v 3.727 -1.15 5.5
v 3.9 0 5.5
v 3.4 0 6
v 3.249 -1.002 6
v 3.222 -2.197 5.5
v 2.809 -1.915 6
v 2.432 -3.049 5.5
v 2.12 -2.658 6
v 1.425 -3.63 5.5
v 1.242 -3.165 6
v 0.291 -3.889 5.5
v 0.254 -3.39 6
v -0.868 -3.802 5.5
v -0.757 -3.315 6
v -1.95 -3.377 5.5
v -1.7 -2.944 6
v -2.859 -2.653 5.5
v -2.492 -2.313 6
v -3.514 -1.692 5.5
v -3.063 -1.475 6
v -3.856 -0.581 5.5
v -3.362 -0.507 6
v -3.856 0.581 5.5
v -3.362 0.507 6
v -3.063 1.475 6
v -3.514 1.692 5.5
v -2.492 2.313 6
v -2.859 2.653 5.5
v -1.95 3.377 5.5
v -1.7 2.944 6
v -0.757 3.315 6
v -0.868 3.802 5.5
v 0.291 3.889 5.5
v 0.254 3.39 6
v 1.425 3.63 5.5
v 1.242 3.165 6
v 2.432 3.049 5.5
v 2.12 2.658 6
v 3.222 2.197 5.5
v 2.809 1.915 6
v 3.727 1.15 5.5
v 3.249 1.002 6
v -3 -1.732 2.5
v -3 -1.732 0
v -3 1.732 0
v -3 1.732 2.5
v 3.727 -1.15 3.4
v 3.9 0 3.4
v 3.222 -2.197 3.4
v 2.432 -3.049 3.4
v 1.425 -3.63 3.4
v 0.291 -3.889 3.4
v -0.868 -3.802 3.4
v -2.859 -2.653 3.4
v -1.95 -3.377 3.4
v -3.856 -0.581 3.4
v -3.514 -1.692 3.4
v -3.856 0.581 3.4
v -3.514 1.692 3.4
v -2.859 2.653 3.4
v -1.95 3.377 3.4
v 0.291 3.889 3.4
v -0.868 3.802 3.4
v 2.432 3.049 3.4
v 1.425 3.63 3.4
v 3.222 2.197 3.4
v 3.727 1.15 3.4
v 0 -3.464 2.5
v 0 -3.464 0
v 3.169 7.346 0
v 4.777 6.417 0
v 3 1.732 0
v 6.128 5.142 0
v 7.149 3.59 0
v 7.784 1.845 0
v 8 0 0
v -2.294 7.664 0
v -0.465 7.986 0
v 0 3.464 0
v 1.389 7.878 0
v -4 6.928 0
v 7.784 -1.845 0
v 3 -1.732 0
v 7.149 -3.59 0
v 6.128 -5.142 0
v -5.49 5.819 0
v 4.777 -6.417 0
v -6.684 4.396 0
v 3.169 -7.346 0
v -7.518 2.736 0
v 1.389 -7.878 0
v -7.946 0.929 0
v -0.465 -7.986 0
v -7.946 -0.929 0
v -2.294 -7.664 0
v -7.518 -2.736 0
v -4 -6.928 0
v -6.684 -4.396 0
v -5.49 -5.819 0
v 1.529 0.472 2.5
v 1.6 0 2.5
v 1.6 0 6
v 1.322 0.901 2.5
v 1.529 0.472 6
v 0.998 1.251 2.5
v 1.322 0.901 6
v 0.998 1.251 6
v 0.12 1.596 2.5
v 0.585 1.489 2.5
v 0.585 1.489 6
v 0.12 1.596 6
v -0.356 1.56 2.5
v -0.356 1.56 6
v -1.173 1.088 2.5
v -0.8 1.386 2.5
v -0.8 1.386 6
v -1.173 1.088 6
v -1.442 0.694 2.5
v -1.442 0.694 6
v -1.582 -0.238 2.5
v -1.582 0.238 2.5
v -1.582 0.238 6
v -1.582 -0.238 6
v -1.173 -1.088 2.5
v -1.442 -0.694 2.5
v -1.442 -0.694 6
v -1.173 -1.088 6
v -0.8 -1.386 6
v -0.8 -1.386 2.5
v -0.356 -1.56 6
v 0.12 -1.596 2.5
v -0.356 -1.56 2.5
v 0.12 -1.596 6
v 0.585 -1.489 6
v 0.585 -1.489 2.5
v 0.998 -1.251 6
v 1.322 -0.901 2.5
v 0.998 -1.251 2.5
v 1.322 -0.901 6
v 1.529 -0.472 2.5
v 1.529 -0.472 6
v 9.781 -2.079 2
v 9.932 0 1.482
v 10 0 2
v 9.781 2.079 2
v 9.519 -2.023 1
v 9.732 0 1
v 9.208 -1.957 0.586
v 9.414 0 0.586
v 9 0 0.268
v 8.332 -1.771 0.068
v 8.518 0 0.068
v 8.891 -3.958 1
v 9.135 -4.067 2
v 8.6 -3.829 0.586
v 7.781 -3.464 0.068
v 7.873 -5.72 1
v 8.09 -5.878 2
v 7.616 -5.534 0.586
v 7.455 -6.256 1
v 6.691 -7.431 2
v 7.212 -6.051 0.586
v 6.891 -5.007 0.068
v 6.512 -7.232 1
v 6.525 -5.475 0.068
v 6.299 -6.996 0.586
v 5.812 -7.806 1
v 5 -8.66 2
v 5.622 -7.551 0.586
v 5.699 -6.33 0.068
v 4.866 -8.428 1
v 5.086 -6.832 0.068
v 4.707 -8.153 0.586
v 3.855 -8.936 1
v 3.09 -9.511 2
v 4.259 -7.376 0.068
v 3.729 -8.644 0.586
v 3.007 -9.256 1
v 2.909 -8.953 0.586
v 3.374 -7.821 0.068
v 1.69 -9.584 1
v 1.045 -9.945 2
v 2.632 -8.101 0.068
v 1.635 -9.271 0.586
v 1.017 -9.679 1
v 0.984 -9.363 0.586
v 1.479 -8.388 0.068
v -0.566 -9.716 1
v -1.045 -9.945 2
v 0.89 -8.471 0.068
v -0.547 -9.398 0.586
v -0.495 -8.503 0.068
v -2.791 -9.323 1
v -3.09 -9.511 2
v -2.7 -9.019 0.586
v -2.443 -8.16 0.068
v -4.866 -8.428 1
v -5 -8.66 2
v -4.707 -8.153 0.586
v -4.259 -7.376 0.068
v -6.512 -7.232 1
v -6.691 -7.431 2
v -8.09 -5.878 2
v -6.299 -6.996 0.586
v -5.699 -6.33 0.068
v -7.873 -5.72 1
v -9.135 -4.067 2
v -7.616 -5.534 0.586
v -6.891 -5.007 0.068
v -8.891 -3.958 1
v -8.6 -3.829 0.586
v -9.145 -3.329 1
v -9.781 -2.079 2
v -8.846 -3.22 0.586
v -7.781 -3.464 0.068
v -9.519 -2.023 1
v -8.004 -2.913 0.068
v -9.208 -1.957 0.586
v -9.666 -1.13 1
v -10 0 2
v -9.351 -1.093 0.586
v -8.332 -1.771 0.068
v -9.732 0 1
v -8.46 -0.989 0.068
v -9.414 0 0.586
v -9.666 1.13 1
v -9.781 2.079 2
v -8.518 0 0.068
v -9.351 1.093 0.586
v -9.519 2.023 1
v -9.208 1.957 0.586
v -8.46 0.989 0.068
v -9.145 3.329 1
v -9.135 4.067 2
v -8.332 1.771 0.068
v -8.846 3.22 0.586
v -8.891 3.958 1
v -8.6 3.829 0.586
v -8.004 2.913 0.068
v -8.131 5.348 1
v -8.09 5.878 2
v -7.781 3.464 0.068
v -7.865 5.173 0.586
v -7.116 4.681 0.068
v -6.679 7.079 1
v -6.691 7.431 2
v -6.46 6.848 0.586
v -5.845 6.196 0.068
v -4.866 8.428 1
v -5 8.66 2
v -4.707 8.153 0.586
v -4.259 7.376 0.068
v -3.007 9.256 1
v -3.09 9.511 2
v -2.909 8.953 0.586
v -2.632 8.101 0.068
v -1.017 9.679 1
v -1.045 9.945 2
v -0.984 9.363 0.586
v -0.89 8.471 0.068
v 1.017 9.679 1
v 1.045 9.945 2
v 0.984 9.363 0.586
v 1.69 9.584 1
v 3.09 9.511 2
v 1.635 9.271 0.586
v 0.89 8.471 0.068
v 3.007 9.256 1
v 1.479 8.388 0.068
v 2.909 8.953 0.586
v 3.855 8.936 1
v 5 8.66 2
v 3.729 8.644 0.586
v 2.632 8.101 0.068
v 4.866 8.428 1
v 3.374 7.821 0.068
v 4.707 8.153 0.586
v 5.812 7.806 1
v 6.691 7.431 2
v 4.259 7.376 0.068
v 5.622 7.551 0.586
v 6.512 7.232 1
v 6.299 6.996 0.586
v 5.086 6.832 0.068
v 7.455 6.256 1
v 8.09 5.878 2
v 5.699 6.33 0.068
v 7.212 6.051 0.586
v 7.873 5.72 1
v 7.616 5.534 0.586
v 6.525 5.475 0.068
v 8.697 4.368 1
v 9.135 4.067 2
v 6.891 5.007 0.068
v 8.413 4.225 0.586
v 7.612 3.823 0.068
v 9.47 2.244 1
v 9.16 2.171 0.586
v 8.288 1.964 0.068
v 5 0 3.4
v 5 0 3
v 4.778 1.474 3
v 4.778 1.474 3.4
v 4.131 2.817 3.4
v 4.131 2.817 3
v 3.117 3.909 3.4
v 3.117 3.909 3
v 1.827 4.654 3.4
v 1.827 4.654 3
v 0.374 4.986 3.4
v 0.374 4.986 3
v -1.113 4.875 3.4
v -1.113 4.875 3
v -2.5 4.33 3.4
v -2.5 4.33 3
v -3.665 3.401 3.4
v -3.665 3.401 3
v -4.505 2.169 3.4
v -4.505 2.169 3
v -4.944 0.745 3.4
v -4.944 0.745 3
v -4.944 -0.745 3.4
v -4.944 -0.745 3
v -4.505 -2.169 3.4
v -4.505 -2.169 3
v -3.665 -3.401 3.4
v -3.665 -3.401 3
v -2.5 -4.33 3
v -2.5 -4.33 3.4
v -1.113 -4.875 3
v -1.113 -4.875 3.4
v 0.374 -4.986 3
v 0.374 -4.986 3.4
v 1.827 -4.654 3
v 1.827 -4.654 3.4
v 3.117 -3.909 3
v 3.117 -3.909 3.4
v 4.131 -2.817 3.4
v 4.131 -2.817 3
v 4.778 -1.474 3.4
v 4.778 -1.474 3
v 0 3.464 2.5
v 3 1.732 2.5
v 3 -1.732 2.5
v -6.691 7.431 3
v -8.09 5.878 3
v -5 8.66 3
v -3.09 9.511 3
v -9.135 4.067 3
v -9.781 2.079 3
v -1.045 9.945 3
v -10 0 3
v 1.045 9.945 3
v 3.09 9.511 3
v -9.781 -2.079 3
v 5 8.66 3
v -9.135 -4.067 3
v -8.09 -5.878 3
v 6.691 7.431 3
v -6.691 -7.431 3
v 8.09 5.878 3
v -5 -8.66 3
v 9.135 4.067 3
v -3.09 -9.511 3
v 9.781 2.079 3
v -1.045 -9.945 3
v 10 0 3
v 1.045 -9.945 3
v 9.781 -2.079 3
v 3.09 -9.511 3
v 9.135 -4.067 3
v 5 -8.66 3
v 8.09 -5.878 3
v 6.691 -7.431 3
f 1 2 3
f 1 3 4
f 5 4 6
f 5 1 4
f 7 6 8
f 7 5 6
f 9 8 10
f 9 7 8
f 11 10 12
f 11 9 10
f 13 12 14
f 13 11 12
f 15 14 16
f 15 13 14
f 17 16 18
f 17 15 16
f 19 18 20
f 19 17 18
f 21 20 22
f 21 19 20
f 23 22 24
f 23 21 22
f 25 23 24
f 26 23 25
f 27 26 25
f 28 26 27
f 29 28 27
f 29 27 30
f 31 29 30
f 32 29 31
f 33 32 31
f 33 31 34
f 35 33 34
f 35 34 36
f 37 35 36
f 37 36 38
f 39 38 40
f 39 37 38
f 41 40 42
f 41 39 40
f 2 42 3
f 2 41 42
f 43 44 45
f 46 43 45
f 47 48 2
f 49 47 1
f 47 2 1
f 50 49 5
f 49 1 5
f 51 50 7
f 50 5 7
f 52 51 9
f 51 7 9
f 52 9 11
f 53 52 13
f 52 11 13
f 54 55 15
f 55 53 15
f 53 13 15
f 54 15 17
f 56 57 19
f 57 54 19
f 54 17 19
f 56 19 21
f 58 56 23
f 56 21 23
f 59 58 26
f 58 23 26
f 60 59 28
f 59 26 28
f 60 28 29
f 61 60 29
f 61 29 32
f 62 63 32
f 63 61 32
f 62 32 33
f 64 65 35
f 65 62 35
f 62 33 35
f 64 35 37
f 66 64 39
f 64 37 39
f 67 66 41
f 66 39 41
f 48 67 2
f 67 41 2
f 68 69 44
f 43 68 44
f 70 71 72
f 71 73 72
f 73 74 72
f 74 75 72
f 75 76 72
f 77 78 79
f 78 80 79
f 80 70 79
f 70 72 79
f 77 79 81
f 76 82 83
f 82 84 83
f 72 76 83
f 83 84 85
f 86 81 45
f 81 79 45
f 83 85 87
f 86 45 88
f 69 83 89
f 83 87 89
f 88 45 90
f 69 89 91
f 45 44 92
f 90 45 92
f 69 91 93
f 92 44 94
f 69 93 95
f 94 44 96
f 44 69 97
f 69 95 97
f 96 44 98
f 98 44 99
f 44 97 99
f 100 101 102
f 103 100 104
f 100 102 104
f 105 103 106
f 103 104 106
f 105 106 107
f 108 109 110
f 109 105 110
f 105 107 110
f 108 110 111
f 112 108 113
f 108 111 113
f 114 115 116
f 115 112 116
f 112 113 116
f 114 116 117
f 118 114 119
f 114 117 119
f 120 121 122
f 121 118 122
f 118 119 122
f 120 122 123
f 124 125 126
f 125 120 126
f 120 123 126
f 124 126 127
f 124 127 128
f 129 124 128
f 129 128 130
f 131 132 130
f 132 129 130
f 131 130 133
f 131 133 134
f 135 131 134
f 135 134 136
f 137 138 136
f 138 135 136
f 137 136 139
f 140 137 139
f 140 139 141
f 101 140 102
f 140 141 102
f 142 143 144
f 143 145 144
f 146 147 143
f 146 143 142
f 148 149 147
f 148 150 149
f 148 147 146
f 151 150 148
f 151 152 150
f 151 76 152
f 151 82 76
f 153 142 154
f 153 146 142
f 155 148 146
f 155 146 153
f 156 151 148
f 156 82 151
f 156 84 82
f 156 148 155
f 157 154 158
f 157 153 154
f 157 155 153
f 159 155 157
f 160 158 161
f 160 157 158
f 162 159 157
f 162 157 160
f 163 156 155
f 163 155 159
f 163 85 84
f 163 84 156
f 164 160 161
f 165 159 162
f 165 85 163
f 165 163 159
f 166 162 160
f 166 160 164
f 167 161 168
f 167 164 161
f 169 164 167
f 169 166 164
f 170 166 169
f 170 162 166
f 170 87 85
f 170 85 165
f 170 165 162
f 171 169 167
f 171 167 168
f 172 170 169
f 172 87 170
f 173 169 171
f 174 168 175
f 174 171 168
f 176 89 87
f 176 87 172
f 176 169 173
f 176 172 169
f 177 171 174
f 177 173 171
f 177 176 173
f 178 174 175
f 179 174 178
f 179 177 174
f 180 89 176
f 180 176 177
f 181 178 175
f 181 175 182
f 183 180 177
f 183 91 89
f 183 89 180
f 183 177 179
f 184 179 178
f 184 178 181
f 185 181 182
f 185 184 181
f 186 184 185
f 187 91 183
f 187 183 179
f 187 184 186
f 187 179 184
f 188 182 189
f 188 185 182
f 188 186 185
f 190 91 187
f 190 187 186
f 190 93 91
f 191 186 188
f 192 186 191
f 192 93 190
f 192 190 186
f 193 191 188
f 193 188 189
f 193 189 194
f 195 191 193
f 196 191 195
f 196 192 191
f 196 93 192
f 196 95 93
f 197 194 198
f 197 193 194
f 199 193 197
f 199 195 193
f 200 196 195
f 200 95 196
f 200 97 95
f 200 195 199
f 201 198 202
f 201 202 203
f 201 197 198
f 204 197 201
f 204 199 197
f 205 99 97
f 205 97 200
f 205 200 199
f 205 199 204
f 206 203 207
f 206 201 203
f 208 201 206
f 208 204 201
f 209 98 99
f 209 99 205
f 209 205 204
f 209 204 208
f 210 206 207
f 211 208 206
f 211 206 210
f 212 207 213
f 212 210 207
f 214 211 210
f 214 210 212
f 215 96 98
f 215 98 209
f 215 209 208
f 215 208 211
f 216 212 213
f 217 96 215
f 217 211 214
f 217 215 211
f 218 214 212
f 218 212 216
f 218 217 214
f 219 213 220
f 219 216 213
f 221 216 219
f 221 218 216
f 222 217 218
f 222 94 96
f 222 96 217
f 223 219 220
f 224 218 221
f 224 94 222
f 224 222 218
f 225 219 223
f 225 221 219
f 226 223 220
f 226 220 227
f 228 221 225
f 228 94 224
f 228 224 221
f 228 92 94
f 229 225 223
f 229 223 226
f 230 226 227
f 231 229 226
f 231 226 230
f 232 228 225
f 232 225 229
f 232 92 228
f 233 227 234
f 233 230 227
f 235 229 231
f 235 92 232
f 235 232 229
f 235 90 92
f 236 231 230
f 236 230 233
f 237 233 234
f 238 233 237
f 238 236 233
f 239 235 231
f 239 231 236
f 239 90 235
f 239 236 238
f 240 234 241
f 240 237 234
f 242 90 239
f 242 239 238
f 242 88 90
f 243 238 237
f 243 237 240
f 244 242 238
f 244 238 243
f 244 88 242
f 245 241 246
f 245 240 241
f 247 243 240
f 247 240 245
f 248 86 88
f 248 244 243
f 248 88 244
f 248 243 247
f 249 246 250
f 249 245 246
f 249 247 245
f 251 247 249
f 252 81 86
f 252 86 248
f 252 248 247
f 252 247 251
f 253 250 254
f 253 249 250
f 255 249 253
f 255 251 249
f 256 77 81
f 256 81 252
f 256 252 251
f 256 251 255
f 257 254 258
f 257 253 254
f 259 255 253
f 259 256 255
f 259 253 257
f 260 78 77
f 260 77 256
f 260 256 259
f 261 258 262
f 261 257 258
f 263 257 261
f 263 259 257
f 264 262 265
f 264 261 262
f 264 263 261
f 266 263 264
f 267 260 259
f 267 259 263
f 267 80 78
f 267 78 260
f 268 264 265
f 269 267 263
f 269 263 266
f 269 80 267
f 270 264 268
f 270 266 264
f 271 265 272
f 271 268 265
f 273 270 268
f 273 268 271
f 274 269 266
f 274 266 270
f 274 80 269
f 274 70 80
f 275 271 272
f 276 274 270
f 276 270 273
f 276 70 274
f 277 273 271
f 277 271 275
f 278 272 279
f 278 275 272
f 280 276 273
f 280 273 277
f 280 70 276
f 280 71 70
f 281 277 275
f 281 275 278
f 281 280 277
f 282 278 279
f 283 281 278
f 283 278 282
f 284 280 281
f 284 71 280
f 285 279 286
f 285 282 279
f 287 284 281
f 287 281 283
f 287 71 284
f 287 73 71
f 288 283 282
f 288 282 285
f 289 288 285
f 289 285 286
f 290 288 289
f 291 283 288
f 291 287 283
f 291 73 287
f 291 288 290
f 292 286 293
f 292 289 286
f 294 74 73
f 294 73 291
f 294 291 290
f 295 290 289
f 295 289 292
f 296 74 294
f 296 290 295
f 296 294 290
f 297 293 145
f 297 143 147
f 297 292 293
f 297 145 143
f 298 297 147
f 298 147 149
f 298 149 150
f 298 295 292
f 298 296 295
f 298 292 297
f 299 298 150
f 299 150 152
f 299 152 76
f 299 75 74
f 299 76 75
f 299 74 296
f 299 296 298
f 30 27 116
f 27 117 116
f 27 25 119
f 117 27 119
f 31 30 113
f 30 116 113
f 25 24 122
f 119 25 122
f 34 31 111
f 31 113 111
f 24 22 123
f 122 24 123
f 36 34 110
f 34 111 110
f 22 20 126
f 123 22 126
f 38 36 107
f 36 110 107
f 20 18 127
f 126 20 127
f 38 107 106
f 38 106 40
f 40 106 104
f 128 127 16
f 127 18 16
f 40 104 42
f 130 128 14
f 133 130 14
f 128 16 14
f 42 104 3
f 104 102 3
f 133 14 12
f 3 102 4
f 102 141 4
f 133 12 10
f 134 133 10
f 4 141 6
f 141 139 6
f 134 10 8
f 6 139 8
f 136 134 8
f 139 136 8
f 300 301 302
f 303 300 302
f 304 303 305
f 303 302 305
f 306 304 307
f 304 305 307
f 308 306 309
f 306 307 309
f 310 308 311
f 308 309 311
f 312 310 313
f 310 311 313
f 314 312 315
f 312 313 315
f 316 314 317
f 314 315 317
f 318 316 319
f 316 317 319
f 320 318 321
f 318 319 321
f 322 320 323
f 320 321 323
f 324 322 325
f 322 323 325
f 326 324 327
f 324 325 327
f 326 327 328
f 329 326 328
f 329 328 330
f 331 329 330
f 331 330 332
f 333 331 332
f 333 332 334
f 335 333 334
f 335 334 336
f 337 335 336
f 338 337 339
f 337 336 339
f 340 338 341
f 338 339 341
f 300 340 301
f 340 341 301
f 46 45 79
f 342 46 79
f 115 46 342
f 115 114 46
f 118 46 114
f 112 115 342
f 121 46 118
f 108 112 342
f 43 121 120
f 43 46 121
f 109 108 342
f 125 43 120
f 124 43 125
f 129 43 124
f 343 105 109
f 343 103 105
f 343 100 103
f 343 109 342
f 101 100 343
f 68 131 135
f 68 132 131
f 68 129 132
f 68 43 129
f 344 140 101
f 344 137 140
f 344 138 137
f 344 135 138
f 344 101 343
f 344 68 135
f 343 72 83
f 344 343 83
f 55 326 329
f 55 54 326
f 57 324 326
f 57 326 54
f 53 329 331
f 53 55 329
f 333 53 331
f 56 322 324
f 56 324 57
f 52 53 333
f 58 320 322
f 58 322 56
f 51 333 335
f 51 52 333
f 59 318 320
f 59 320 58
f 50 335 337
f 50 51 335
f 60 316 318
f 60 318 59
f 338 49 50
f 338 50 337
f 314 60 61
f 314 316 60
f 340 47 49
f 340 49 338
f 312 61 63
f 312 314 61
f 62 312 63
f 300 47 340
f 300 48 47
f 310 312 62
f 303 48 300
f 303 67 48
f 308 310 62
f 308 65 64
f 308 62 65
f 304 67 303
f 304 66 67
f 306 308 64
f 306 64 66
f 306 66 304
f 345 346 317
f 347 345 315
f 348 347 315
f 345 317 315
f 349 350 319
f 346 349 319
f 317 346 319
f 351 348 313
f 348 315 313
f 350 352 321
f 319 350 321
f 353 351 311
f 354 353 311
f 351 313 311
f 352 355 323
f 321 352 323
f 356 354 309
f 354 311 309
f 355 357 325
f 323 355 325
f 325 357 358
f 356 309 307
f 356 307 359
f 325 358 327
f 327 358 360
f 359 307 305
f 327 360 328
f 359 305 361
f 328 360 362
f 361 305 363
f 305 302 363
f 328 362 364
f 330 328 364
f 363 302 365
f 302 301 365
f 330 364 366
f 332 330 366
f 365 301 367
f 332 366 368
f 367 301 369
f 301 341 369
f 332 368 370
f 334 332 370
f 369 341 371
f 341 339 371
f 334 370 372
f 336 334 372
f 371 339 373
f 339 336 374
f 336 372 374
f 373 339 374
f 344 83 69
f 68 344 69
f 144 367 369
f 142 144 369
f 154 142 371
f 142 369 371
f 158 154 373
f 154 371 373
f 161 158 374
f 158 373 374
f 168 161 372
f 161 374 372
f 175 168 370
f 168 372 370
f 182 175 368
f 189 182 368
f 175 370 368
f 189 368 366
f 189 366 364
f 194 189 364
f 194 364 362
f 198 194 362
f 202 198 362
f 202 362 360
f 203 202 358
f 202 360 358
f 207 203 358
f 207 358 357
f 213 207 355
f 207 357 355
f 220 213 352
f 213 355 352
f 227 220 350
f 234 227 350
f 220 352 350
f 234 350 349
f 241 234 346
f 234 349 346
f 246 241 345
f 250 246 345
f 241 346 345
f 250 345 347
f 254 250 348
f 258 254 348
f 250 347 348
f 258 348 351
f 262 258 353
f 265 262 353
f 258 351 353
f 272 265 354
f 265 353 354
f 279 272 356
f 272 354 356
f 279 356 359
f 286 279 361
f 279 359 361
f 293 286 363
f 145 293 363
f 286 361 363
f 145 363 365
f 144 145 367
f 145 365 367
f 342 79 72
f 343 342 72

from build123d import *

# Parameters (mm, degrees)
F2_SIZE  = 0.5
F3_R     = 5
F3_R_2   = 3.9
F4_DEPTH = 0.4
F5_R     = 2
F6_R     = 1.6
F7_DEPTH = 25
F8_R     = 1.6
F9_DEPTH = 2.5


with BuildPart() as f1:
    # F0 (on Front) → F1 (revolve)
    with BuildSketch(Plane.XZ):
        Polygon((3.9, 6), (0, 6), (0, 0), (10, 0), (10, 3), (3.9, 3), align=None)
    revolve(axis=Axis((0, 0, 3), (0, 0, -1)))

    # F2
    f2_edges = [f1.edges().sort_by_distance(p)[0] for p in [
        (-3.9, 0, 6),
    ]]
    chamfer(f2_edges, length=F2_SIZE)

    # F3 (on face) → F4 (join)
    with BuildSketch(Plane.XY.offset(3)):
        Circle(F3_R)
        Circle(F3_R_2, mode=Mode.SUBTRACT)
    extrude(amount=F4_DEPTH)

    # F5
    f5_edges = [f1.edges().sort_by_distance(p)[0] for p in [
        (-10, 0, 0),
    ]]
    fillet(f5_edges, radius=F5_R)

    # F6 (on face) → F7 (cut)
    with BuildSketch(Plane.XY.offset(6)):
        Circle(F6_R)
    extrude(amount=-F7_DEPTH, mode=Mode.SUBTRACT)

    # F8 (on face) → F9 (cut)
    with BuildSketch(Plane(origin=(0, 0, 0), x_dir=(1, 0, 0), z_dir=(0, 0, -1))):
        Polygon((3, -1.732051), (3, 1.732051), (0, 3.464102), (-3, 1.732051), (-3, -1.732051), (0, -3.464102), align=None)
        Circle(F8_R, mode=Mode.SUBTRACT)
    extrude(amount=-F9_DEPTH, mode=Mode.SUBTRACT)


solid = f1.part
